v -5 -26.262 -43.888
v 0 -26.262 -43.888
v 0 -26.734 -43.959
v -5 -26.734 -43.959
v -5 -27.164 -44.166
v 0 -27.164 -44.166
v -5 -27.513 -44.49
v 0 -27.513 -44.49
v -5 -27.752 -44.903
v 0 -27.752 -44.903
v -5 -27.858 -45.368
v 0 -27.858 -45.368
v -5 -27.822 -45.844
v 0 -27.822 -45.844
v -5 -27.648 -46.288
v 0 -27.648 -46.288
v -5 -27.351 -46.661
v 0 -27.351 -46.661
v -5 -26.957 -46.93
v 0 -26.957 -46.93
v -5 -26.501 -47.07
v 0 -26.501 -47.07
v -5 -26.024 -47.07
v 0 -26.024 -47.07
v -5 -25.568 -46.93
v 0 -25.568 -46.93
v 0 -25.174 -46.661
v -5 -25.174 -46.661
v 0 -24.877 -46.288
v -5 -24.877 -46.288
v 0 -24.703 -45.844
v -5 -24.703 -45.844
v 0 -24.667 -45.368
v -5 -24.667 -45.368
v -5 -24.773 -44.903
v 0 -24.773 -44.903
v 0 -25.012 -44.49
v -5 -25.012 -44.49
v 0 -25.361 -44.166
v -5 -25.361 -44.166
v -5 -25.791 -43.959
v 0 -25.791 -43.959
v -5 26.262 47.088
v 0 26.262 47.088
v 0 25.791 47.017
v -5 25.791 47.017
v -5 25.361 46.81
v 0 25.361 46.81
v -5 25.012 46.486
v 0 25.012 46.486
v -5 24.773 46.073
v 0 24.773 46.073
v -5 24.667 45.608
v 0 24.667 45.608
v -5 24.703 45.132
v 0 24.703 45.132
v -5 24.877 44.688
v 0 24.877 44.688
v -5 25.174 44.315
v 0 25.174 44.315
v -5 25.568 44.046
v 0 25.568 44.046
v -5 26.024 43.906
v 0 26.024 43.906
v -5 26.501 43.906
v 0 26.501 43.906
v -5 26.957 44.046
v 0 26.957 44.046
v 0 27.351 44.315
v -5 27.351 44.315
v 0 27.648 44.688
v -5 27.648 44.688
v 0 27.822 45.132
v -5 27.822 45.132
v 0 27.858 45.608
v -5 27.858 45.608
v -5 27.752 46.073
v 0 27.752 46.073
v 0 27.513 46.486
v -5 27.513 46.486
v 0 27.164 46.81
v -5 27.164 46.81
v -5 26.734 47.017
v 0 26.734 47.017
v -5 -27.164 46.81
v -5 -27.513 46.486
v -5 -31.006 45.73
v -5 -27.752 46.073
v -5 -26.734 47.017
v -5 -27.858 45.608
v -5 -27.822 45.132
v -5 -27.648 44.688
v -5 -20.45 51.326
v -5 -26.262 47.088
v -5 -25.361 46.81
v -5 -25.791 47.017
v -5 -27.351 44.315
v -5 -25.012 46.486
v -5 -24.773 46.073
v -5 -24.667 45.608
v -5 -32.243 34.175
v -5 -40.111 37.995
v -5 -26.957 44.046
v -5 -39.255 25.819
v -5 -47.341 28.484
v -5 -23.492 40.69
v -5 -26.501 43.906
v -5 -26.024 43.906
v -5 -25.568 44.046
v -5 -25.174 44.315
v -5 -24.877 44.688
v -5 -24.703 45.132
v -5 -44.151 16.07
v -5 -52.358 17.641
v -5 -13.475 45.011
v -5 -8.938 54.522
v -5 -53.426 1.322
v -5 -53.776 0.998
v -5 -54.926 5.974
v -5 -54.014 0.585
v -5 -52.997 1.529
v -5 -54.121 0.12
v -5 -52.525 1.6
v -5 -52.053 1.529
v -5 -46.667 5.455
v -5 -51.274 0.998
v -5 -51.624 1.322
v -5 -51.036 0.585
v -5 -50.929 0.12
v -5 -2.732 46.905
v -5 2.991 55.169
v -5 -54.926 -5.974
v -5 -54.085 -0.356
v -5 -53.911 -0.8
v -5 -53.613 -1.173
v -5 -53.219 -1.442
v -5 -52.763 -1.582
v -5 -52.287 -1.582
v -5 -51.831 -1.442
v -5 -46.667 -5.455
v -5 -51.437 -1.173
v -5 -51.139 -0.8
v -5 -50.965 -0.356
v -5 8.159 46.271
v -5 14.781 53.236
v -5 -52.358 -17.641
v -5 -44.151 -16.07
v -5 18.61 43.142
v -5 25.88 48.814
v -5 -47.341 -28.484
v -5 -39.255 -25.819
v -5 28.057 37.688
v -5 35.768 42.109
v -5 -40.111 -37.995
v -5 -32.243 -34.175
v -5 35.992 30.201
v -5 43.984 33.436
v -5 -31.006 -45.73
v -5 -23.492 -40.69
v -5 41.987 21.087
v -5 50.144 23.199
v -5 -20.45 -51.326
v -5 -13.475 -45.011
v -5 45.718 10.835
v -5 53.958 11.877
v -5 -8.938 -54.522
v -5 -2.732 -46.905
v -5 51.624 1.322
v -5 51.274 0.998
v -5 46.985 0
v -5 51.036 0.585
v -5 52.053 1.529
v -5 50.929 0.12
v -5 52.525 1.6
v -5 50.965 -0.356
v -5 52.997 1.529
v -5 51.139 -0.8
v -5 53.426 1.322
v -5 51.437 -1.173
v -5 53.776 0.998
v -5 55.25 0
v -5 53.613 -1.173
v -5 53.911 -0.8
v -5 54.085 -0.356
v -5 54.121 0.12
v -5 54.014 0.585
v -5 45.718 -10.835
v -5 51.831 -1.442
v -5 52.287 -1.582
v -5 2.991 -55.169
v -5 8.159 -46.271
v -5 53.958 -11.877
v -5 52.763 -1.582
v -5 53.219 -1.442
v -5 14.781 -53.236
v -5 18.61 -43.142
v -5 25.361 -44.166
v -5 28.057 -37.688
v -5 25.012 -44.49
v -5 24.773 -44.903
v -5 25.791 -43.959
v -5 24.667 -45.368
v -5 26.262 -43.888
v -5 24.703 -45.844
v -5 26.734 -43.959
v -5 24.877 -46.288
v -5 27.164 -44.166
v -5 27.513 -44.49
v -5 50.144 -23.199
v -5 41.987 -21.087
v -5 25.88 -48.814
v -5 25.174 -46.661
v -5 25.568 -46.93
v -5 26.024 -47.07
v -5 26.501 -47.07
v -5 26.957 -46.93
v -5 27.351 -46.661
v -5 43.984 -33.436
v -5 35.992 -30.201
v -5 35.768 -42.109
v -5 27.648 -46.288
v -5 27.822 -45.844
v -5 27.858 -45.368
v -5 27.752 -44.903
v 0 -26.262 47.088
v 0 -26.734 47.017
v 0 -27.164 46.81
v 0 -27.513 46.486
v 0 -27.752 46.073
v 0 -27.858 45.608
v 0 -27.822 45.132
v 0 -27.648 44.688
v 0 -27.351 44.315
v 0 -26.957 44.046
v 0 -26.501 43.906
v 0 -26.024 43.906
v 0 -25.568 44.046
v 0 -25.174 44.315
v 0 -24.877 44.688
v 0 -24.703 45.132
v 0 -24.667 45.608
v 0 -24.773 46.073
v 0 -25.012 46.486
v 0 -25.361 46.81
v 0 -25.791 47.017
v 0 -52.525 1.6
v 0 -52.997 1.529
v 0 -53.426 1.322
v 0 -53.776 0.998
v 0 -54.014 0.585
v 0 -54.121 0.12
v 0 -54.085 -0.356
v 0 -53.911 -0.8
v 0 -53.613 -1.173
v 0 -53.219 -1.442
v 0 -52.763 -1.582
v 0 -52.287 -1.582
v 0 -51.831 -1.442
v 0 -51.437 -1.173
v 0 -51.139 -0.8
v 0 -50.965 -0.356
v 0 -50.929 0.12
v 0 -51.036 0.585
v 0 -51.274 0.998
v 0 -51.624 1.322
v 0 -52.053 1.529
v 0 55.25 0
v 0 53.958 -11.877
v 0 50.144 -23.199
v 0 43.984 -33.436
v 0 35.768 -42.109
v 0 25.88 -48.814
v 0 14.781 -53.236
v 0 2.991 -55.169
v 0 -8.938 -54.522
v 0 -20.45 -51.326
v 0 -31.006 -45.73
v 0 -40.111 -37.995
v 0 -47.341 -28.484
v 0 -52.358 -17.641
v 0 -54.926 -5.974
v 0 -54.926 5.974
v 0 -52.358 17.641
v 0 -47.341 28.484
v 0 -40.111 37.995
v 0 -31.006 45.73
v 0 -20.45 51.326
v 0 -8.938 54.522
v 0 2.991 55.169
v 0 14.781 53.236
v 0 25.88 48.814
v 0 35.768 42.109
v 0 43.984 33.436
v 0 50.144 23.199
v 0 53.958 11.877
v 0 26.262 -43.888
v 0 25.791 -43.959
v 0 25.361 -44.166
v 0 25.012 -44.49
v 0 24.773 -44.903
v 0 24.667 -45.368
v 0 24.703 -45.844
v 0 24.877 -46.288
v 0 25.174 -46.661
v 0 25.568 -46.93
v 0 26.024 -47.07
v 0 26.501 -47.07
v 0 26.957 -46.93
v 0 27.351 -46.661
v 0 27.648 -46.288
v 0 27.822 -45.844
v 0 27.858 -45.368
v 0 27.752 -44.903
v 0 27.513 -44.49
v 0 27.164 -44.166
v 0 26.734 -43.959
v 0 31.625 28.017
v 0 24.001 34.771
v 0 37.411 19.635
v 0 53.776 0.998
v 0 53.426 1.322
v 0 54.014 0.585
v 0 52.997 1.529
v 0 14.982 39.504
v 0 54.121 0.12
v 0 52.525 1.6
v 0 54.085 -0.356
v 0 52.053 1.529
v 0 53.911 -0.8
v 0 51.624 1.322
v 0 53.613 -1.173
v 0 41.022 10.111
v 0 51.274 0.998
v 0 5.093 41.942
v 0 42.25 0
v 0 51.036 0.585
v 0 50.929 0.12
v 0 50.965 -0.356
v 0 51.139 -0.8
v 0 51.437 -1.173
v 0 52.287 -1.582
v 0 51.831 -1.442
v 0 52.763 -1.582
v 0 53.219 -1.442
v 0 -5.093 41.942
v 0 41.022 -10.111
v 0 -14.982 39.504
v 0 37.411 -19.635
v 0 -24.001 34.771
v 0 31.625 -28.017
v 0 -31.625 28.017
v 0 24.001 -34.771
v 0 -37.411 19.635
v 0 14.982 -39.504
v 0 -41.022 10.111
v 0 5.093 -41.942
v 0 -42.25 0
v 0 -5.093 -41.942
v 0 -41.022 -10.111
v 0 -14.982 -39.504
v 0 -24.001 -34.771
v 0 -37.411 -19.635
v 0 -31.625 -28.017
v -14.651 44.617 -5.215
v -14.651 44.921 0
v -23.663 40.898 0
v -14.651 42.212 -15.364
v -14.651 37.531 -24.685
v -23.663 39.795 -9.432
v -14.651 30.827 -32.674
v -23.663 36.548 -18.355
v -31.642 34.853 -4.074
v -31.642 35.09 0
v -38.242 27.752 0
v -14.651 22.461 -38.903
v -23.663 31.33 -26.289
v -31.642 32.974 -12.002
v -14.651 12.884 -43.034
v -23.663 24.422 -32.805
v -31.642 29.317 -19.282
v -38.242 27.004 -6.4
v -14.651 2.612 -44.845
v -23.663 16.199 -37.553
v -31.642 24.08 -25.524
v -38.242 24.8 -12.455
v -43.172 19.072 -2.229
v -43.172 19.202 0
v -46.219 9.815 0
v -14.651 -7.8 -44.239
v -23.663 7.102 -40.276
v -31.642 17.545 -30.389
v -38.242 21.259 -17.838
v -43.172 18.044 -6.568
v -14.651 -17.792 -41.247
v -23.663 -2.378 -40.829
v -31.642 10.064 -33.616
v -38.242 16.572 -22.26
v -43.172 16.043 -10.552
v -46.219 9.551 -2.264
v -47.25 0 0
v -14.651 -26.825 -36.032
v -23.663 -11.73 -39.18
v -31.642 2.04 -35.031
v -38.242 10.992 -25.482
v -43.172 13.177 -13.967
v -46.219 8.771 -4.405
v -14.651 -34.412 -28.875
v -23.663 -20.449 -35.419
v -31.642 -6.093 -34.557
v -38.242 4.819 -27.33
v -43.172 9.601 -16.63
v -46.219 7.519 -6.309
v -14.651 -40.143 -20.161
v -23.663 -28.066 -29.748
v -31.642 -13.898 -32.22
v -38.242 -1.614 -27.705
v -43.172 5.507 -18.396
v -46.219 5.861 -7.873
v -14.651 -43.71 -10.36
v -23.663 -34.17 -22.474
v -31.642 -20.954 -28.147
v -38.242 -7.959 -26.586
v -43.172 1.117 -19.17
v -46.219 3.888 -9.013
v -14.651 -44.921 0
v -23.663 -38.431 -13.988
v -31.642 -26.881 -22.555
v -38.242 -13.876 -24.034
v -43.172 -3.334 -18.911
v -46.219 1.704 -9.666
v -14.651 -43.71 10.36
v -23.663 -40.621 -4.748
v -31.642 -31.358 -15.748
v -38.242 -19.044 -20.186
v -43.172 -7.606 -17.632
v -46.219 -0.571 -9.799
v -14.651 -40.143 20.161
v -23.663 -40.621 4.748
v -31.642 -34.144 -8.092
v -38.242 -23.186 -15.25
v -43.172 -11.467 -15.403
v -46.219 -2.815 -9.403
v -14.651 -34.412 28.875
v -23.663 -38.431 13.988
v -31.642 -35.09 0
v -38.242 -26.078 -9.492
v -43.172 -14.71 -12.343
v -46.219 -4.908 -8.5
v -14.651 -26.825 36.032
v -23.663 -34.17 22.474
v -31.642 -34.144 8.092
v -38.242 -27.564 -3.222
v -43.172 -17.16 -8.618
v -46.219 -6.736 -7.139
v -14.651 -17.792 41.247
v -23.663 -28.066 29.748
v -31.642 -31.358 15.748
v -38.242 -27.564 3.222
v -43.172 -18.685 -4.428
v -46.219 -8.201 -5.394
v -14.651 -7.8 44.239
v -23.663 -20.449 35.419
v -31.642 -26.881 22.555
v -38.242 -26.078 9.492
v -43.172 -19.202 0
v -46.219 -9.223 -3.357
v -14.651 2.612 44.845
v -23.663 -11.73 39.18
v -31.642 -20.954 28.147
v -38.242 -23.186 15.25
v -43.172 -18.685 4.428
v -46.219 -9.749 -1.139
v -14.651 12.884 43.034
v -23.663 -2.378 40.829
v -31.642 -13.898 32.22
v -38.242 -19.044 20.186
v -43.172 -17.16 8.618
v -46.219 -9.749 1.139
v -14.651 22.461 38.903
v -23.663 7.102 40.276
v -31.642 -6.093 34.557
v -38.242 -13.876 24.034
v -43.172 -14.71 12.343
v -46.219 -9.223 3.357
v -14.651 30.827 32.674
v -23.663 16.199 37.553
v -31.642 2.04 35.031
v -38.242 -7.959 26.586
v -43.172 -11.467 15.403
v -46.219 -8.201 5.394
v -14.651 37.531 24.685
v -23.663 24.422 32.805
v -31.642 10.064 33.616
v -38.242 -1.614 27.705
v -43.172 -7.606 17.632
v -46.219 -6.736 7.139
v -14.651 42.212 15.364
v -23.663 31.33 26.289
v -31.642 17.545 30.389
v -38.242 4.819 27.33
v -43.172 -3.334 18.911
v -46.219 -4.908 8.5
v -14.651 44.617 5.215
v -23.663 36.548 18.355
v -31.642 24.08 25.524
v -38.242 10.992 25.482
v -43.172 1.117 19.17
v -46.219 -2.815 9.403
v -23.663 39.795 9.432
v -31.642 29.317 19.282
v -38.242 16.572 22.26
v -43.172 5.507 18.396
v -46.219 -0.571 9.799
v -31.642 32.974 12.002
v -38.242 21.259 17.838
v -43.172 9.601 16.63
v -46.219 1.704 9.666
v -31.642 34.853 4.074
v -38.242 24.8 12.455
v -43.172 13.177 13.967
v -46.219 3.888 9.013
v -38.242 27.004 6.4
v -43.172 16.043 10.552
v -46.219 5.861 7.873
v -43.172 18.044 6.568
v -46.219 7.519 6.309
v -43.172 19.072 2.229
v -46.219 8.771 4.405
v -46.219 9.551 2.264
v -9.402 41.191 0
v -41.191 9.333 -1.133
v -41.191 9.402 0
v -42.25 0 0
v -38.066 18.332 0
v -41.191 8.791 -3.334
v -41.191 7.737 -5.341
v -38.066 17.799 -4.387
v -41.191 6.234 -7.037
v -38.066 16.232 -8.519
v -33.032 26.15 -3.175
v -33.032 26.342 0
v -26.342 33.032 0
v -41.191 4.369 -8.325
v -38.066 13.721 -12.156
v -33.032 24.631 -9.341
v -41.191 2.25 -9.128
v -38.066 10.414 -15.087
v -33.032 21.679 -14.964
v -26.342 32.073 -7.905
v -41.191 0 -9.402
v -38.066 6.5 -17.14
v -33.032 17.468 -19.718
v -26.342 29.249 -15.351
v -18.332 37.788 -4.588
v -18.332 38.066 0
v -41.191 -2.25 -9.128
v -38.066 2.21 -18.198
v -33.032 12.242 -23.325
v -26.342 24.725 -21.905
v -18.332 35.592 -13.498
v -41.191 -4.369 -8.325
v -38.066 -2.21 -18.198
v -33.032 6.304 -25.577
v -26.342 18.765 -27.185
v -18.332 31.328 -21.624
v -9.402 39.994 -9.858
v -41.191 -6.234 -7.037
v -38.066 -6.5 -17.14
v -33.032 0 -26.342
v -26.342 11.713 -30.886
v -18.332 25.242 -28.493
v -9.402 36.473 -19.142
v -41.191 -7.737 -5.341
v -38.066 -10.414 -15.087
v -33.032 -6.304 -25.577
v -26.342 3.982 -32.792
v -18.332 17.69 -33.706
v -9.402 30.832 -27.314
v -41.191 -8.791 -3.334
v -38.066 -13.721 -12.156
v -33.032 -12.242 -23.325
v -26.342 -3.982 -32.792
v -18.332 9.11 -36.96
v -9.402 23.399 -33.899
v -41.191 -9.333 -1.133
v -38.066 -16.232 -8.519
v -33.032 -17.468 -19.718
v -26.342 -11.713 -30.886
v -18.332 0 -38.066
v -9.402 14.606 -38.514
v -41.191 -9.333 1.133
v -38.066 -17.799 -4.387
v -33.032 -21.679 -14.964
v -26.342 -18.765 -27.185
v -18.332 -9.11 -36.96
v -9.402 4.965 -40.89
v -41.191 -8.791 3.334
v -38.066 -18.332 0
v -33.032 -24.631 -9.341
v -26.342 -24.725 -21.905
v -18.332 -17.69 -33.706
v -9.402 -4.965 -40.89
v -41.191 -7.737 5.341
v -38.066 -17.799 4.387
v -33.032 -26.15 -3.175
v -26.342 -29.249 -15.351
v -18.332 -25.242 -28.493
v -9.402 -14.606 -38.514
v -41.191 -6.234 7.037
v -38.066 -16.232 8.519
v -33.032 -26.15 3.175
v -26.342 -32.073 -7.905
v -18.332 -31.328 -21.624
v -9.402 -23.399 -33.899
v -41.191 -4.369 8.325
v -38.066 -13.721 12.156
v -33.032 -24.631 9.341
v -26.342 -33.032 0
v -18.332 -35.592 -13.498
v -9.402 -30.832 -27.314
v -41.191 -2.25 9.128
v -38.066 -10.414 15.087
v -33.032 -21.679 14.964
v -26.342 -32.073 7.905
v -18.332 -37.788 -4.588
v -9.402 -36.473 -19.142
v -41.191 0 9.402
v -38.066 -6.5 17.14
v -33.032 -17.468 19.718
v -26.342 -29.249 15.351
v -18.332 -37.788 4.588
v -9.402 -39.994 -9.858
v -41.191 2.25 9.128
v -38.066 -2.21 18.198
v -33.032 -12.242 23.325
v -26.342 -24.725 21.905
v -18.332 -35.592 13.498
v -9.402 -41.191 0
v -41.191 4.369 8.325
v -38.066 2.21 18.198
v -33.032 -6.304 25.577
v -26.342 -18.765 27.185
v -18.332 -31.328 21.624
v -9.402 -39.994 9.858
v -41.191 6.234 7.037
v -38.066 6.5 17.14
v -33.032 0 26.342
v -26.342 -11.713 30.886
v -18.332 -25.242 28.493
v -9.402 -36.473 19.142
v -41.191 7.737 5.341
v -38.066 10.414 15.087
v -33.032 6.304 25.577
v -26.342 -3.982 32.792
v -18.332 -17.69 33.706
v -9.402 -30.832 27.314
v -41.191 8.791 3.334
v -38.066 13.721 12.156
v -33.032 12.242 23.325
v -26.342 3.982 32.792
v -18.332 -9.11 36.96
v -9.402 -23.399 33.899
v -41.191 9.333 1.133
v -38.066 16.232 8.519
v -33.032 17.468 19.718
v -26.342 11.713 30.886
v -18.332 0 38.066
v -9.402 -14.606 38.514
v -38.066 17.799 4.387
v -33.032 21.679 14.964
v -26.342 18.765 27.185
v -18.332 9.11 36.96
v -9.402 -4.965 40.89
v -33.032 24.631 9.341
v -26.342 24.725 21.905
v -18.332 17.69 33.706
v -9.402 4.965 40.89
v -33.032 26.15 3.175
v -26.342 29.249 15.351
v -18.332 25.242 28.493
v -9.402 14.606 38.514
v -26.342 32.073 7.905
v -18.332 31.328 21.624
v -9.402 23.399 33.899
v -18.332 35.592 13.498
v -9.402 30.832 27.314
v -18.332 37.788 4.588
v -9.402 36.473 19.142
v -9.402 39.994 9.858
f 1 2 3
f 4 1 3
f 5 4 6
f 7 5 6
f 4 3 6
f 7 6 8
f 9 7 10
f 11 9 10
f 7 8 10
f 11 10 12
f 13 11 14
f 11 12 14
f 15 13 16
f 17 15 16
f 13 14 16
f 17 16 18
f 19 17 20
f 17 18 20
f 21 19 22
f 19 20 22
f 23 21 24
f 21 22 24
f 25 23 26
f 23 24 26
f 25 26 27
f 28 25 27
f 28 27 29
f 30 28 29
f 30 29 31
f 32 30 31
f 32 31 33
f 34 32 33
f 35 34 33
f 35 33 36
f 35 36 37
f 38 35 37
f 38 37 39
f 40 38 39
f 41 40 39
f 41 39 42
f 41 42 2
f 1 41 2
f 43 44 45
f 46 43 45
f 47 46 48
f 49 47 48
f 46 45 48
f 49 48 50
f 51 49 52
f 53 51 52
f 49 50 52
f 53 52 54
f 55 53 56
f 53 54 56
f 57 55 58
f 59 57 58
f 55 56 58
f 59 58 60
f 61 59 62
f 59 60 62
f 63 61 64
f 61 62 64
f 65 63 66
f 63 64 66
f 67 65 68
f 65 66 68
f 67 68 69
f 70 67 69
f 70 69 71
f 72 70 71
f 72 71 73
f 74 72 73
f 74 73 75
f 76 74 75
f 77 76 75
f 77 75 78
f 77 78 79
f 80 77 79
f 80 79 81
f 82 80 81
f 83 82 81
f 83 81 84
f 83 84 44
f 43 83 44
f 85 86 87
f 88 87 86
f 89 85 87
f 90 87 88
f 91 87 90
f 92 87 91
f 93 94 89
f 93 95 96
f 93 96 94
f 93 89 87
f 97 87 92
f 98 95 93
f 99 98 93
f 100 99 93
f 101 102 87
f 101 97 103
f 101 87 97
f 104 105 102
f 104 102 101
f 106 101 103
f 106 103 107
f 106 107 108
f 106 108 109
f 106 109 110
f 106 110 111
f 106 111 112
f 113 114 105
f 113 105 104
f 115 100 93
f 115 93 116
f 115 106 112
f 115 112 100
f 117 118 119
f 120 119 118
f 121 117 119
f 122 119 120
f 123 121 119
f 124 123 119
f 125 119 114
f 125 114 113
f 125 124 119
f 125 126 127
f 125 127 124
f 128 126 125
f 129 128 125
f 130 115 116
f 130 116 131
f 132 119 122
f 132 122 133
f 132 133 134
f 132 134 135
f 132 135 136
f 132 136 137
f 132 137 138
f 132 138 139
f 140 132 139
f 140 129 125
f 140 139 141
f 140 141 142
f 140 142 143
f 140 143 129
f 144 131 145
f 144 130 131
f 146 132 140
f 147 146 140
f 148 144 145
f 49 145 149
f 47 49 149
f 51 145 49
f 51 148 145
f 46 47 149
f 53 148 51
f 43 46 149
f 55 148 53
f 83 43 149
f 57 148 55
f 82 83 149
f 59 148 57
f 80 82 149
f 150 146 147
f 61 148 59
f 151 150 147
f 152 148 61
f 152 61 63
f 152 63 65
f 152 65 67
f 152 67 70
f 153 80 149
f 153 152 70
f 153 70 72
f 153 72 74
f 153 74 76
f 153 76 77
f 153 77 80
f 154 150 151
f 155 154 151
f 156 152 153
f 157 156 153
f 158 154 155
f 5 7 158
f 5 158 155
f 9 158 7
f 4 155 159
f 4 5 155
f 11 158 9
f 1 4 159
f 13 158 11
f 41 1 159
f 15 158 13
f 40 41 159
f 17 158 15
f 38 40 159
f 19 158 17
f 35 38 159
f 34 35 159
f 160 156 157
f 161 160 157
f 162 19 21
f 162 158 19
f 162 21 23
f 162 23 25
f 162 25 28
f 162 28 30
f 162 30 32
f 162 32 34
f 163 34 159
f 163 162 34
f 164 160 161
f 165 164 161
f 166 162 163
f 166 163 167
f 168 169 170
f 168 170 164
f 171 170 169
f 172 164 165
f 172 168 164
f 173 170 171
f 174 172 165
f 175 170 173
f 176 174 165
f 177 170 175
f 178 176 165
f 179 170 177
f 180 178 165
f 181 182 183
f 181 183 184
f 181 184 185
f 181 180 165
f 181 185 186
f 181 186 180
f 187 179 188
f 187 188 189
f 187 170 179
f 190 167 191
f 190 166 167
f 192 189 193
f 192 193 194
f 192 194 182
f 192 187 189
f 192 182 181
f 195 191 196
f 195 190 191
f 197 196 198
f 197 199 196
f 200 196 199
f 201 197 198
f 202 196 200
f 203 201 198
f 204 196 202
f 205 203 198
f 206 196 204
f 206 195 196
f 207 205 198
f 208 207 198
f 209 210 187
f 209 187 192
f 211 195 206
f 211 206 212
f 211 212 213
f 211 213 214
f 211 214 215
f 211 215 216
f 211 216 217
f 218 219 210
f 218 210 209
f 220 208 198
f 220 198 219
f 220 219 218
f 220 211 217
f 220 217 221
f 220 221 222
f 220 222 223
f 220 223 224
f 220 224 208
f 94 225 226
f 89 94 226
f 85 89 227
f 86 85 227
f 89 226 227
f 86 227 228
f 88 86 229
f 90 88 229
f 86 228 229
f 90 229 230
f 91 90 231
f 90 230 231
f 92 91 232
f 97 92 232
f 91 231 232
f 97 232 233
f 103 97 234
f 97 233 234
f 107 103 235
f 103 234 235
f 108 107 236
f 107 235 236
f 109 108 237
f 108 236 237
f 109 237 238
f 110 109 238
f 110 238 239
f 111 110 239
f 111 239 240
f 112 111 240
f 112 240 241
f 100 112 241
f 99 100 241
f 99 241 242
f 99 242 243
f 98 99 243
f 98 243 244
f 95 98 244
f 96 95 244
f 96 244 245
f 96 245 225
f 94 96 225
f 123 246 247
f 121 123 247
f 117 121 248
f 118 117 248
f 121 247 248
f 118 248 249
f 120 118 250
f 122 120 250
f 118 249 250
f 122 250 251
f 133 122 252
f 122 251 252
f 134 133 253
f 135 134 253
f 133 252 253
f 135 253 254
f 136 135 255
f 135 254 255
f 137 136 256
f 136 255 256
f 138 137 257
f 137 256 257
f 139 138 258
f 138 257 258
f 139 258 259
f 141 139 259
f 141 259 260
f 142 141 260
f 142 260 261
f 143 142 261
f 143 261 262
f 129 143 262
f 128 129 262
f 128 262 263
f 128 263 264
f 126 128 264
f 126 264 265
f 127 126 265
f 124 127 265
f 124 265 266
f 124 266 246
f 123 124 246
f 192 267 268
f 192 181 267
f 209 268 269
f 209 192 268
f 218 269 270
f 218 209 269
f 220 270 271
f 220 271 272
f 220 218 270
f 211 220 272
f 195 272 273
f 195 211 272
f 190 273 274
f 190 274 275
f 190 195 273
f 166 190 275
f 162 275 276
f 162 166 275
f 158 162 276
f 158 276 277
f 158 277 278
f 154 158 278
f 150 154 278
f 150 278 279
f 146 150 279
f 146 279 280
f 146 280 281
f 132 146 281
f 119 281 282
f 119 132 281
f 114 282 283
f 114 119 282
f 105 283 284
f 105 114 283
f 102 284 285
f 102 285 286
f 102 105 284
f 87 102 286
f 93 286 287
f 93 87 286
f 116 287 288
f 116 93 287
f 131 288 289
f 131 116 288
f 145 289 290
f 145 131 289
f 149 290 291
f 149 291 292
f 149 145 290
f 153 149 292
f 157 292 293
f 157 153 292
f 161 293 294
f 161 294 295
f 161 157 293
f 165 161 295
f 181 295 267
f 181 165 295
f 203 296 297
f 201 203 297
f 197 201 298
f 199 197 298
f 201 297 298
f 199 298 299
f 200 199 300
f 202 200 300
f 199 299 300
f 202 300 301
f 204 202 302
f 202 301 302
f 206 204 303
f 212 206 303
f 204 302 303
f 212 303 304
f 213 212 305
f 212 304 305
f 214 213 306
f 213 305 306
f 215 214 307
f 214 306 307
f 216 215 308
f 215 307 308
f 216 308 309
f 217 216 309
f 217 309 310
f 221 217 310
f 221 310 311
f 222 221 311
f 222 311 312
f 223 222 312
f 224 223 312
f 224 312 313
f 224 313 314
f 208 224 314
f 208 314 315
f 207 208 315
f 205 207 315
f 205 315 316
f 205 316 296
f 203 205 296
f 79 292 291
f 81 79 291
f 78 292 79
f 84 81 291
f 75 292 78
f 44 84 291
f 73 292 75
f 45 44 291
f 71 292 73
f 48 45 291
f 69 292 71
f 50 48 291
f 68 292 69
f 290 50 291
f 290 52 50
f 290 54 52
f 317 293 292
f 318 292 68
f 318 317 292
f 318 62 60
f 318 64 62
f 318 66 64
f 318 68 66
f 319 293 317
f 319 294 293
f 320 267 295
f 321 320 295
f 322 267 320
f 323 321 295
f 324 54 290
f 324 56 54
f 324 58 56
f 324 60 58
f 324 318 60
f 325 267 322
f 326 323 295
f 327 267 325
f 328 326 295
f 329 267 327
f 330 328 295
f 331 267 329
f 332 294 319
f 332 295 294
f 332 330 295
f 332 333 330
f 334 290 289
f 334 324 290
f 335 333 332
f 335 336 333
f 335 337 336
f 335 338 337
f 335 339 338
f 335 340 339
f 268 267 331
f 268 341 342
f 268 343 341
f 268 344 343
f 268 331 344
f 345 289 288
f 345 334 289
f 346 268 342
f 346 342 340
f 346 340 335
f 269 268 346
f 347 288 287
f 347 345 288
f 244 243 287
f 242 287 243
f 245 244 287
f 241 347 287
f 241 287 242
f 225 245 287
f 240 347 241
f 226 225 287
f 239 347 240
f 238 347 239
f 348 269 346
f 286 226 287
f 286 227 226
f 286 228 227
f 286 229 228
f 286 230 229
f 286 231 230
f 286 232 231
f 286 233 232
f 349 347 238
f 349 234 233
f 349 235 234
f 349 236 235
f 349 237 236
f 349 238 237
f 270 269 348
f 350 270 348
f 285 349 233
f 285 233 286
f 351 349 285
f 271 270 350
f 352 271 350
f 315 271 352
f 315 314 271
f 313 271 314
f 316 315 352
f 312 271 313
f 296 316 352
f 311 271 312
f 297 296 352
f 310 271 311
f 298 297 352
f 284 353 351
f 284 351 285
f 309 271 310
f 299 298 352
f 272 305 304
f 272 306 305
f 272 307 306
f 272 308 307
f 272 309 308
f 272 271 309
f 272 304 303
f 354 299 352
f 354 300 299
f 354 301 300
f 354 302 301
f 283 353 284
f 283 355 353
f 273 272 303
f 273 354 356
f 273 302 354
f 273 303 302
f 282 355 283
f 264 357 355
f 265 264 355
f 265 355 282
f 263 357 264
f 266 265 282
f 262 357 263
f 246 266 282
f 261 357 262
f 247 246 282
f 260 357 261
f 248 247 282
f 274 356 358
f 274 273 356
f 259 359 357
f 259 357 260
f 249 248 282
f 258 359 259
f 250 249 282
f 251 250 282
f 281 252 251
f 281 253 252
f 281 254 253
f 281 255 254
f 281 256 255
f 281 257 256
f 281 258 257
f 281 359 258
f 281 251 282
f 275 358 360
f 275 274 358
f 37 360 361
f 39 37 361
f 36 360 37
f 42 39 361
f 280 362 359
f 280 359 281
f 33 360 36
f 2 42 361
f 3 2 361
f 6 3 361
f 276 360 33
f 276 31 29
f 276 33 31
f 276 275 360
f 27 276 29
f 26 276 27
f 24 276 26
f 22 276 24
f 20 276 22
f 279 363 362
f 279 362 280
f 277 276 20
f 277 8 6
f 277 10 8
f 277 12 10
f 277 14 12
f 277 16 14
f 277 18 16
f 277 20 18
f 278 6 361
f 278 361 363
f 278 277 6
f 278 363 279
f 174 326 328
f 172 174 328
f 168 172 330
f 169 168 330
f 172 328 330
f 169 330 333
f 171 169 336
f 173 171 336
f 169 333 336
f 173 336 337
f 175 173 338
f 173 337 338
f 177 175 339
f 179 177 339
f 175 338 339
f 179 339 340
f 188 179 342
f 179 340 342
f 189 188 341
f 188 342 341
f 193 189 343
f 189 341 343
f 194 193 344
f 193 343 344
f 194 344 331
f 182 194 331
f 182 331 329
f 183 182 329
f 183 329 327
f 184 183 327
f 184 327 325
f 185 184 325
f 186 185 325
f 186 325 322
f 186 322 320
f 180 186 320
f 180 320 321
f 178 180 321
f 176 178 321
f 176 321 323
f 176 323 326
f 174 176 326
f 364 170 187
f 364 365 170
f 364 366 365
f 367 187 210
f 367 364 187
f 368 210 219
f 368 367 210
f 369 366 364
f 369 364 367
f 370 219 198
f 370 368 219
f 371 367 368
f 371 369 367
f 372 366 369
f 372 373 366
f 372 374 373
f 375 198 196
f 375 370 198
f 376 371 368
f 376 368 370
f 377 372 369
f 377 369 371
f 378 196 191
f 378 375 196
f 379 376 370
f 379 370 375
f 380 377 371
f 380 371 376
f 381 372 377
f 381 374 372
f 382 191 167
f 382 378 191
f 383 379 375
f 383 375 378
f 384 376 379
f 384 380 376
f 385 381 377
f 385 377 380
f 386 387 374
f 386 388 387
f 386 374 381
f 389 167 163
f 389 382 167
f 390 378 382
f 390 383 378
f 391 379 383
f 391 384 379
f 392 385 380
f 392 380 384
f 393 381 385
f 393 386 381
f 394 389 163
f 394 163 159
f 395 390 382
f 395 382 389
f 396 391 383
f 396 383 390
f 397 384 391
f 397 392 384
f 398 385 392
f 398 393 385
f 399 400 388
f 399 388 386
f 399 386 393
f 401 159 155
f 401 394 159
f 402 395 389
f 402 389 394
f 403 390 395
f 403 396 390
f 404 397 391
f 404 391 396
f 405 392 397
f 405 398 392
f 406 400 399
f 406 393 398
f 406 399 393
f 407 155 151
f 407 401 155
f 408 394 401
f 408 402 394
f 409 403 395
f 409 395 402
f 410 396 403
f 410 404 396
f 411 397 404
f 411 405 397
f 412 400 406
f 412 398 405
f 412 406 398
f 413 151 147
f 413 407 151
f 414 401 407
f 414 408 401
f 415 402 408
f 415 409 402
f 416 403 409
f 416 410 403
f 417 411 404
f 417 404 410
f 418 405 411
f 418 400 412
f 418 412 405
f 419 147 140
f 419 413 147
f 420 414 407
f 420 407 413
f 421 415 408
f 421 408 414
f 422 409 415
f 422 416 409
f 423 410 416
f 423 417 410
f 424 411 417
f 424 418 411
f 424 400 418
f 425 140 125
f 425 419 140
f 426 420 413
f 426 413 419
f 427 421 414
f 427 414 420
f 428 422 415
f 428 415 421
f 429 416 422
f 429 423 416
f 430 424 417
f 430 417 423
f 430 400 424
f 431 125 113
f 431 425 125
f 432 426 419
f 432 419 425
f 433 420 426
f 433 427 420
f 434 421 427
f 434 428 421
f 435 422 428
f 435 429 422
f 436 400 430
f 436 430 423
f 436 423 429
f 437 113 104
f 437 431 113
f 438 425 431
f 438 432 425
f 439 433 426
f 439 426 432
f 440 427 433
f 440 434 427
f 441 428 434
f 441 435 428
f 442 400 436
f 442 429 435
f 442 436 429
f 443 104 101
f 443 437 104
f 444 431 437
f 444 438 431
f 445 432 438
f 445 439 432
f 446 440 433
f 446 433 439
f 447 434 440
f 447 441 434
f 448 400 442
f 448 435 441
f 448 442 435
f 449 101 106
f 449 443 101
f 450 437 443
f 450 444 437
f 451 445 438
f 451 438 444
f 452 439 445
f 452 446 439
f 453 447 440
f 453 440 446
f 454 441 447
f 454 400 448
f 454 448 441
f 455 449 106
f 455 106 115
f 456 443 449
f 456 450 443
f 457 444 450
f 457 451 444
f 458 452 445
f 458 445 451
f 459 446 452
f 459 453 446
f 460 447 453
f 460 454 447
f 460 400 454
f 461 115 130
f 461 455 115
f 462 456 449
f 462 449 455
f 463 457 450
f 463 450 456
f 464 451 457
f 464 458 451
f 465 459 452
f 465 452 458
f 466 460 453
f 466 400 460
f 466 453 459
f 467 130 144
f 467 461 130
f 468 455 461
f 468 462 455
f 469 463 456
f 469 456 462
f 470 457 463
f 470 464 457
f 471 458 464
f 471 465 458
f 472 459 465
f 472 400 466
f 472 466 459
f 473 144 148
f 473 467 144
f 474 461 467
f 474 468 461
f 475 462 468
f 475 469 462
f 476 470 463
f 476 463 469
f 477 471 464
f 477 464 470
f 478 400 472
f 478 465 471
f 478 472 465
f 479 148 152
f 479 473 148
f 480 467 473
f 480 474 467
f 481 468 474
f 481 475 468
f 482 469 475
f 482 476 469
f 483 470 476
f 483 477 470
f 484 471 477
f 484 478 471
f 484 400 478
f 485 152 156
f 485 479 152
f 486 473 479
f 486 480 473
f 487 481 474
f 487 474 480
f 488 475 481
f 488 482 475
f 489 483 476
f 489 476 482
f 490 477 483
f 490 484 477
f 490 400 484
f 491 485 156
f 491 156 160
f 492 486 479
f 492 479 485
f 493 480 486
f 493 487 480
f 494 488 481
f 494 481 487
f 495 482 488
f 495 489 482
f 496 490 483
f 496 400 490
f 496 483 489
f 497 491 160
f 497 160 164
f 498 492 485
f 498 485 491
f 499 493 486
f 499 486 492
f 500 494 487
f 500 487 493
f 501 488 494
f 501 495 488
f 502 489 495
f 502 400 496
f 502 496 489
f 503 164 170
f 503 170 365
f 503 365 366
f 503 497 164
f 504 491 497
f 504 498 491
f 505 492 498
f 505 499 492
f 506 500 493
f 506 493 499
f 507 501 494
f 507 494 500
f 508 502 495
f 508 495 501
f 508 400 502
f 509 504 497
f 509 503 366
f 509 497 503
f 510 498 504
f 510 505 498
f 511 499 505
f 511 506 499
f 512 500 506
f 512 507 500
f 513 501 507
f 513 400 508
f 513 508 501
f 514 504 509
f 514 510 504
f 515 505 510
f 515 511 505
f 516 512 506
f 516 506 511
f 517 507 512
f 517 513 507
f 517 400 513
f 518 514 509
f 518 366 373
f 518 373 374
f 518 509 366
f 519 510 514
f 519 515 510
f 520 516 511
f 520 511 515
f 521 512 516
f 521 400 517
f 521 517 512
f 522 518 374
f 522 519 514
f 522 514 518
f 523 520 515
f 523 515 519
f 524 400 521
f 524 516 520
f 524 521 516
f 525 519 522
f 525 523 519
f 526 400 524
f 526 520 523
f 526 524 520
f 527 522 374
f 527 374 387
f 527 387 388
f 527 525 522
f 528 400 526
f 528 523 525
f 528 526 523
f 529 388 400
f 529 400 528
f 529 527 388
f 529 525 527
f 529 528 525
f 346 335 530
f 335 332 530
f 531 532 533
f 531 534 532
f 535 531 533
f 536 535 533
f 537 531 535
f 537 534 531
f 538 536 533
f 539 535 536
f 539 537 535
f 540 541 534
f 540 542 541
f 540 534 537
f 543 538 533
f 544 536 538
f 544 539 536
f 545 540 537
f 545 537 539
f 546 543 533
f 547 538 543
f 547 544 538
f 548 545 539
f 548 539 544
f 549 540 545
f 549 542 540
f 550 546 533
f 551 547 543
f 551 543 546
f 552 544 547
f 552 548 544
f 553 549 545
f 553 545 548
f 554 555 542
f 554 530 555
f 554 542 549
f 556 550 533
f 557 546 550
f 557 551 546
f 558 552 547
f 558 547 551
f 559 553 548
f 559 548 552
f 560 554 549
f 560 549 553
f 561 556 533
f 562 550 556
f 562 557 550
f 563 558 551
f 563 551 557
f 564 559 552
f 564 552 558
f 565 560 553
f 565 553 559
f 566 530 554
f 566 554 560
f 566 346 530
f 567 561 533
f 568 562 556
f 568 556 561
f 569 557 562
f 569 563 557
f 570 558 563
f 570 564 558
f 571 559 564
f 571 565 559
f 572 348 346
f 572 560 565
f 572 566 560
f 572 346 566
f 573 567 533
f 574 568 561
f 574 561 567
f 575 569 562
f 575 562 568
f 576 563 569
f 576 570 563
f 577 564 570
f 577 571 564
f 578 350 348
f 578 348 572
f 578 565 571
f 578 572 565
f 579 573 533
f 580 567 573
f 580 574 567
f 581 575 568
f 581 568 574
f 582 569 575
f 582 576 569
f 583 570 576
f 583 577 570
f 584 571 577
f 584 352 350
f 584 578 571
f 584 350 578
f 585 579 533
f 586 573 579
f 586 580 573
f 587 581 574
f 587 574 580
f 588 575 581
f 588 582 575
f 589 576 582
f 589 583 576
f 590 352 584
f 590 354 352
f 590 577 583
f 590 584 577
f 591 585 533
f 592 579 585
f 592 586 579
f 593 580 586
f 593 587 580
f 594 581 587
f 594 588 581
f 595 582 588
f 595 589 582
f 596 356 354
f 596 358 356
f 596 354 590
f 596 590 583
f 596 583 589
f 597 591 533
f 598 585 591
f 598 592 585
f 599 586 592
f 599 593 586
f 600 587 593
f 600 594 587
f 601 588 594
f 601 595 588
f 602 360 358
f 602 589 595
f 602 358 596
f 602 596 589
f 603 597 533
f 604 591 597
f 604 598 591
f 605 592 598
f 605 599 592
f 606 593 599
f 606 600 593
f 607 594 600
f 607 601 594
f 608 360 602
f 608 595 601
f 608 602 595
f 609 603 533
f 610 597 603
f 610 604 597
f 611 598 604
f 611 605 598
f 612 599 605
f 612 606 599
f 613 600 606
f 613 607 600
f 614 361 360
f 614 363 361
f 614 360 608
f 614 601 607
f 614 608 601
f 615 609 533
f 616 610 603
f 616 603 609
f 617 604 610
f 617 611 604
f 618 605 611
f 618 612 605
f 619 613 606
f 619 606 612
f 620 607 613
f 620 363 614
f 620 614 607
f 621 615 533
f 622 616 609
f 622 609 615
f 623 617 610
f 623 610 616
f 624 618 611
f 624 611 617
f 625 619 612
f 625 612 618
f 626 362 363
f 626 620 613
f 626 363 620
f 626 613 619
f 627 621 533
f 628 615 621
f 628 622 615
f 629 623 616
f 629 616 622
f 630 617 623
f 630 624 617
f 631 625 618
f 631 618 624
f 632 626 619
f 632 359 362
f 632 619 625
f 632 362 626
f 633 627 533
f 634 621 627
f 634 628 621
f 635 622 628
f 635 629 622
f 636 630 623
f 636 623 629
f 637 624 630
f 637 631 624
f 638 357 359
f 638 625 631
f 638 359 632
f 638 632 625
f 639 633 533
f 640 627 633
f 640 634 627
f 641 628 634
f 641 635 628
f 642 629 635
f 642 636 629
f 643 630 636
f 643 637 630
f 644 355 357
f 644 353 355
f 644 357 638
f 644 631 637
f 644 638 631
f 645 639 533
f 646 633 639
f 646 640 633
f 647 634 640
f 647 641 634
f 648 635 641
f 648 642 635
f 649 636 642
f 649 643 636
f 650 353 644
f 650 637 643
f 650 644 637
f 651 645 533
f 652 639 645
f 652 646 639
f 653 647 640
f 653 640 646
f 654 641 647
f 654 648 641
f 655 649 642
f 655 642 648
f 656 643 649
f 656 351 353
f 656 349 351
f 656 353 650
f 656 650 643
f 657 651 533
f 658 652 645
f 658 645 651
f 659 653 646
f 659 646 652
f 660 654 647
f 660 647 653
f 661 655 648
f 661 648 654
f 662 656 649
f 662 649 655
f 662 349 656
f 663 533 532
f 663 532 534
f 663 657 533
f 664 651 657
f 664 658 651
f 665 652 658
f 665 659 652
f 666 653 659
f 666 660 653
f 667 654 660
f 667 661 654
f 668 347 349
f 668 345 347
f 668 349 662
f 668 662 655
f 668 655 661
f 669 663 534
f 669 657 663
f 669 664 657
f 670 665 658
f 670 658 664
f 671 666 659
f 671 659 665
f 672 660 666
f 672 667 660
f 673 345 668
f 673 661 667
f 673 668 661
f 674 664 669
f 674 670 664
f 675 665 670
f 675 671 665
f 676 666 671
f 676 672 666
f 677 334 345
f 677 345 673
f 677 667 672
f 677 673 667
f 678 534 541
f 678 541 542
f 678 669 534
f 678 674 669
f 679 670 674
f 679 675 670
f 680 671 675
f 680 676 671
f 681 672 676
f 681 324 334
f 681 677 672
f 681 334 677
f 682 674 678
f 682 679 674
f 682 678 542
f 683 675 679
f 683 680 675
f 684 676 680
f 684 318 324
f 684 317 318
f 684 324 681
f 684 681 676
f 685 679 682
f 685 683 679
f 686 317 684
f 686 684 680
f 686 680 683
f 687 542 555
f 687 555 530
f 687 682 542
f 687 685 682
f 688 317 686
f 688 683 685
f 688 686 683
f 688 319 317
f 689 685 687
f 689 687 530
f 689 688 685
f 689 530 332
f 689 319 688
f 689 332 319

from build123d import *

# Parameters (mm, degrees)
HOLE_WIZARD_3_2_3_2_1_D = 3.2


with BuildPart() as part:
    # 草图1 → 旋转1 (revolve)
    with BuildSketch(Plane.XY):
        with BuildLine():
            Line((0, 42.25), (0, 55.25))
            Line((0, 55.25), (-5, 55.25))
            Line((-5, 55.25), (-5, 46.984704958))
            ThreePointArc((-5, 46.984704958), (-35.134118034, 31.593610905), (-47.25, 0))
            Line((-47.25, 0), (-42.25, 0))
            ThreePointArc((-42.25, 0), (-29.875261505, 29.875261505), (0, 42.25))
        make_face()
    revolve(axis=Axis((0, 0, 0), (-1, 0, 0)))

    # Ø3.2 (3.2) 直径孔1 (through all)
    with Locations(Plane(origin=(-5, 52.525, 0), x_dir=(0, 0, -1), z_dir=(-1, 0, 0))):
        with Locations((0, 0), (-45.487984334, 26.2625), (-45.487984334, 78.7875), (0, 105.05), (45.487984334, 78.7875), (45.487984334, 26.2625)):
            Hole(HOLE_WIZARD_3_2_3_2_1_D / 2)


solid = part.part
